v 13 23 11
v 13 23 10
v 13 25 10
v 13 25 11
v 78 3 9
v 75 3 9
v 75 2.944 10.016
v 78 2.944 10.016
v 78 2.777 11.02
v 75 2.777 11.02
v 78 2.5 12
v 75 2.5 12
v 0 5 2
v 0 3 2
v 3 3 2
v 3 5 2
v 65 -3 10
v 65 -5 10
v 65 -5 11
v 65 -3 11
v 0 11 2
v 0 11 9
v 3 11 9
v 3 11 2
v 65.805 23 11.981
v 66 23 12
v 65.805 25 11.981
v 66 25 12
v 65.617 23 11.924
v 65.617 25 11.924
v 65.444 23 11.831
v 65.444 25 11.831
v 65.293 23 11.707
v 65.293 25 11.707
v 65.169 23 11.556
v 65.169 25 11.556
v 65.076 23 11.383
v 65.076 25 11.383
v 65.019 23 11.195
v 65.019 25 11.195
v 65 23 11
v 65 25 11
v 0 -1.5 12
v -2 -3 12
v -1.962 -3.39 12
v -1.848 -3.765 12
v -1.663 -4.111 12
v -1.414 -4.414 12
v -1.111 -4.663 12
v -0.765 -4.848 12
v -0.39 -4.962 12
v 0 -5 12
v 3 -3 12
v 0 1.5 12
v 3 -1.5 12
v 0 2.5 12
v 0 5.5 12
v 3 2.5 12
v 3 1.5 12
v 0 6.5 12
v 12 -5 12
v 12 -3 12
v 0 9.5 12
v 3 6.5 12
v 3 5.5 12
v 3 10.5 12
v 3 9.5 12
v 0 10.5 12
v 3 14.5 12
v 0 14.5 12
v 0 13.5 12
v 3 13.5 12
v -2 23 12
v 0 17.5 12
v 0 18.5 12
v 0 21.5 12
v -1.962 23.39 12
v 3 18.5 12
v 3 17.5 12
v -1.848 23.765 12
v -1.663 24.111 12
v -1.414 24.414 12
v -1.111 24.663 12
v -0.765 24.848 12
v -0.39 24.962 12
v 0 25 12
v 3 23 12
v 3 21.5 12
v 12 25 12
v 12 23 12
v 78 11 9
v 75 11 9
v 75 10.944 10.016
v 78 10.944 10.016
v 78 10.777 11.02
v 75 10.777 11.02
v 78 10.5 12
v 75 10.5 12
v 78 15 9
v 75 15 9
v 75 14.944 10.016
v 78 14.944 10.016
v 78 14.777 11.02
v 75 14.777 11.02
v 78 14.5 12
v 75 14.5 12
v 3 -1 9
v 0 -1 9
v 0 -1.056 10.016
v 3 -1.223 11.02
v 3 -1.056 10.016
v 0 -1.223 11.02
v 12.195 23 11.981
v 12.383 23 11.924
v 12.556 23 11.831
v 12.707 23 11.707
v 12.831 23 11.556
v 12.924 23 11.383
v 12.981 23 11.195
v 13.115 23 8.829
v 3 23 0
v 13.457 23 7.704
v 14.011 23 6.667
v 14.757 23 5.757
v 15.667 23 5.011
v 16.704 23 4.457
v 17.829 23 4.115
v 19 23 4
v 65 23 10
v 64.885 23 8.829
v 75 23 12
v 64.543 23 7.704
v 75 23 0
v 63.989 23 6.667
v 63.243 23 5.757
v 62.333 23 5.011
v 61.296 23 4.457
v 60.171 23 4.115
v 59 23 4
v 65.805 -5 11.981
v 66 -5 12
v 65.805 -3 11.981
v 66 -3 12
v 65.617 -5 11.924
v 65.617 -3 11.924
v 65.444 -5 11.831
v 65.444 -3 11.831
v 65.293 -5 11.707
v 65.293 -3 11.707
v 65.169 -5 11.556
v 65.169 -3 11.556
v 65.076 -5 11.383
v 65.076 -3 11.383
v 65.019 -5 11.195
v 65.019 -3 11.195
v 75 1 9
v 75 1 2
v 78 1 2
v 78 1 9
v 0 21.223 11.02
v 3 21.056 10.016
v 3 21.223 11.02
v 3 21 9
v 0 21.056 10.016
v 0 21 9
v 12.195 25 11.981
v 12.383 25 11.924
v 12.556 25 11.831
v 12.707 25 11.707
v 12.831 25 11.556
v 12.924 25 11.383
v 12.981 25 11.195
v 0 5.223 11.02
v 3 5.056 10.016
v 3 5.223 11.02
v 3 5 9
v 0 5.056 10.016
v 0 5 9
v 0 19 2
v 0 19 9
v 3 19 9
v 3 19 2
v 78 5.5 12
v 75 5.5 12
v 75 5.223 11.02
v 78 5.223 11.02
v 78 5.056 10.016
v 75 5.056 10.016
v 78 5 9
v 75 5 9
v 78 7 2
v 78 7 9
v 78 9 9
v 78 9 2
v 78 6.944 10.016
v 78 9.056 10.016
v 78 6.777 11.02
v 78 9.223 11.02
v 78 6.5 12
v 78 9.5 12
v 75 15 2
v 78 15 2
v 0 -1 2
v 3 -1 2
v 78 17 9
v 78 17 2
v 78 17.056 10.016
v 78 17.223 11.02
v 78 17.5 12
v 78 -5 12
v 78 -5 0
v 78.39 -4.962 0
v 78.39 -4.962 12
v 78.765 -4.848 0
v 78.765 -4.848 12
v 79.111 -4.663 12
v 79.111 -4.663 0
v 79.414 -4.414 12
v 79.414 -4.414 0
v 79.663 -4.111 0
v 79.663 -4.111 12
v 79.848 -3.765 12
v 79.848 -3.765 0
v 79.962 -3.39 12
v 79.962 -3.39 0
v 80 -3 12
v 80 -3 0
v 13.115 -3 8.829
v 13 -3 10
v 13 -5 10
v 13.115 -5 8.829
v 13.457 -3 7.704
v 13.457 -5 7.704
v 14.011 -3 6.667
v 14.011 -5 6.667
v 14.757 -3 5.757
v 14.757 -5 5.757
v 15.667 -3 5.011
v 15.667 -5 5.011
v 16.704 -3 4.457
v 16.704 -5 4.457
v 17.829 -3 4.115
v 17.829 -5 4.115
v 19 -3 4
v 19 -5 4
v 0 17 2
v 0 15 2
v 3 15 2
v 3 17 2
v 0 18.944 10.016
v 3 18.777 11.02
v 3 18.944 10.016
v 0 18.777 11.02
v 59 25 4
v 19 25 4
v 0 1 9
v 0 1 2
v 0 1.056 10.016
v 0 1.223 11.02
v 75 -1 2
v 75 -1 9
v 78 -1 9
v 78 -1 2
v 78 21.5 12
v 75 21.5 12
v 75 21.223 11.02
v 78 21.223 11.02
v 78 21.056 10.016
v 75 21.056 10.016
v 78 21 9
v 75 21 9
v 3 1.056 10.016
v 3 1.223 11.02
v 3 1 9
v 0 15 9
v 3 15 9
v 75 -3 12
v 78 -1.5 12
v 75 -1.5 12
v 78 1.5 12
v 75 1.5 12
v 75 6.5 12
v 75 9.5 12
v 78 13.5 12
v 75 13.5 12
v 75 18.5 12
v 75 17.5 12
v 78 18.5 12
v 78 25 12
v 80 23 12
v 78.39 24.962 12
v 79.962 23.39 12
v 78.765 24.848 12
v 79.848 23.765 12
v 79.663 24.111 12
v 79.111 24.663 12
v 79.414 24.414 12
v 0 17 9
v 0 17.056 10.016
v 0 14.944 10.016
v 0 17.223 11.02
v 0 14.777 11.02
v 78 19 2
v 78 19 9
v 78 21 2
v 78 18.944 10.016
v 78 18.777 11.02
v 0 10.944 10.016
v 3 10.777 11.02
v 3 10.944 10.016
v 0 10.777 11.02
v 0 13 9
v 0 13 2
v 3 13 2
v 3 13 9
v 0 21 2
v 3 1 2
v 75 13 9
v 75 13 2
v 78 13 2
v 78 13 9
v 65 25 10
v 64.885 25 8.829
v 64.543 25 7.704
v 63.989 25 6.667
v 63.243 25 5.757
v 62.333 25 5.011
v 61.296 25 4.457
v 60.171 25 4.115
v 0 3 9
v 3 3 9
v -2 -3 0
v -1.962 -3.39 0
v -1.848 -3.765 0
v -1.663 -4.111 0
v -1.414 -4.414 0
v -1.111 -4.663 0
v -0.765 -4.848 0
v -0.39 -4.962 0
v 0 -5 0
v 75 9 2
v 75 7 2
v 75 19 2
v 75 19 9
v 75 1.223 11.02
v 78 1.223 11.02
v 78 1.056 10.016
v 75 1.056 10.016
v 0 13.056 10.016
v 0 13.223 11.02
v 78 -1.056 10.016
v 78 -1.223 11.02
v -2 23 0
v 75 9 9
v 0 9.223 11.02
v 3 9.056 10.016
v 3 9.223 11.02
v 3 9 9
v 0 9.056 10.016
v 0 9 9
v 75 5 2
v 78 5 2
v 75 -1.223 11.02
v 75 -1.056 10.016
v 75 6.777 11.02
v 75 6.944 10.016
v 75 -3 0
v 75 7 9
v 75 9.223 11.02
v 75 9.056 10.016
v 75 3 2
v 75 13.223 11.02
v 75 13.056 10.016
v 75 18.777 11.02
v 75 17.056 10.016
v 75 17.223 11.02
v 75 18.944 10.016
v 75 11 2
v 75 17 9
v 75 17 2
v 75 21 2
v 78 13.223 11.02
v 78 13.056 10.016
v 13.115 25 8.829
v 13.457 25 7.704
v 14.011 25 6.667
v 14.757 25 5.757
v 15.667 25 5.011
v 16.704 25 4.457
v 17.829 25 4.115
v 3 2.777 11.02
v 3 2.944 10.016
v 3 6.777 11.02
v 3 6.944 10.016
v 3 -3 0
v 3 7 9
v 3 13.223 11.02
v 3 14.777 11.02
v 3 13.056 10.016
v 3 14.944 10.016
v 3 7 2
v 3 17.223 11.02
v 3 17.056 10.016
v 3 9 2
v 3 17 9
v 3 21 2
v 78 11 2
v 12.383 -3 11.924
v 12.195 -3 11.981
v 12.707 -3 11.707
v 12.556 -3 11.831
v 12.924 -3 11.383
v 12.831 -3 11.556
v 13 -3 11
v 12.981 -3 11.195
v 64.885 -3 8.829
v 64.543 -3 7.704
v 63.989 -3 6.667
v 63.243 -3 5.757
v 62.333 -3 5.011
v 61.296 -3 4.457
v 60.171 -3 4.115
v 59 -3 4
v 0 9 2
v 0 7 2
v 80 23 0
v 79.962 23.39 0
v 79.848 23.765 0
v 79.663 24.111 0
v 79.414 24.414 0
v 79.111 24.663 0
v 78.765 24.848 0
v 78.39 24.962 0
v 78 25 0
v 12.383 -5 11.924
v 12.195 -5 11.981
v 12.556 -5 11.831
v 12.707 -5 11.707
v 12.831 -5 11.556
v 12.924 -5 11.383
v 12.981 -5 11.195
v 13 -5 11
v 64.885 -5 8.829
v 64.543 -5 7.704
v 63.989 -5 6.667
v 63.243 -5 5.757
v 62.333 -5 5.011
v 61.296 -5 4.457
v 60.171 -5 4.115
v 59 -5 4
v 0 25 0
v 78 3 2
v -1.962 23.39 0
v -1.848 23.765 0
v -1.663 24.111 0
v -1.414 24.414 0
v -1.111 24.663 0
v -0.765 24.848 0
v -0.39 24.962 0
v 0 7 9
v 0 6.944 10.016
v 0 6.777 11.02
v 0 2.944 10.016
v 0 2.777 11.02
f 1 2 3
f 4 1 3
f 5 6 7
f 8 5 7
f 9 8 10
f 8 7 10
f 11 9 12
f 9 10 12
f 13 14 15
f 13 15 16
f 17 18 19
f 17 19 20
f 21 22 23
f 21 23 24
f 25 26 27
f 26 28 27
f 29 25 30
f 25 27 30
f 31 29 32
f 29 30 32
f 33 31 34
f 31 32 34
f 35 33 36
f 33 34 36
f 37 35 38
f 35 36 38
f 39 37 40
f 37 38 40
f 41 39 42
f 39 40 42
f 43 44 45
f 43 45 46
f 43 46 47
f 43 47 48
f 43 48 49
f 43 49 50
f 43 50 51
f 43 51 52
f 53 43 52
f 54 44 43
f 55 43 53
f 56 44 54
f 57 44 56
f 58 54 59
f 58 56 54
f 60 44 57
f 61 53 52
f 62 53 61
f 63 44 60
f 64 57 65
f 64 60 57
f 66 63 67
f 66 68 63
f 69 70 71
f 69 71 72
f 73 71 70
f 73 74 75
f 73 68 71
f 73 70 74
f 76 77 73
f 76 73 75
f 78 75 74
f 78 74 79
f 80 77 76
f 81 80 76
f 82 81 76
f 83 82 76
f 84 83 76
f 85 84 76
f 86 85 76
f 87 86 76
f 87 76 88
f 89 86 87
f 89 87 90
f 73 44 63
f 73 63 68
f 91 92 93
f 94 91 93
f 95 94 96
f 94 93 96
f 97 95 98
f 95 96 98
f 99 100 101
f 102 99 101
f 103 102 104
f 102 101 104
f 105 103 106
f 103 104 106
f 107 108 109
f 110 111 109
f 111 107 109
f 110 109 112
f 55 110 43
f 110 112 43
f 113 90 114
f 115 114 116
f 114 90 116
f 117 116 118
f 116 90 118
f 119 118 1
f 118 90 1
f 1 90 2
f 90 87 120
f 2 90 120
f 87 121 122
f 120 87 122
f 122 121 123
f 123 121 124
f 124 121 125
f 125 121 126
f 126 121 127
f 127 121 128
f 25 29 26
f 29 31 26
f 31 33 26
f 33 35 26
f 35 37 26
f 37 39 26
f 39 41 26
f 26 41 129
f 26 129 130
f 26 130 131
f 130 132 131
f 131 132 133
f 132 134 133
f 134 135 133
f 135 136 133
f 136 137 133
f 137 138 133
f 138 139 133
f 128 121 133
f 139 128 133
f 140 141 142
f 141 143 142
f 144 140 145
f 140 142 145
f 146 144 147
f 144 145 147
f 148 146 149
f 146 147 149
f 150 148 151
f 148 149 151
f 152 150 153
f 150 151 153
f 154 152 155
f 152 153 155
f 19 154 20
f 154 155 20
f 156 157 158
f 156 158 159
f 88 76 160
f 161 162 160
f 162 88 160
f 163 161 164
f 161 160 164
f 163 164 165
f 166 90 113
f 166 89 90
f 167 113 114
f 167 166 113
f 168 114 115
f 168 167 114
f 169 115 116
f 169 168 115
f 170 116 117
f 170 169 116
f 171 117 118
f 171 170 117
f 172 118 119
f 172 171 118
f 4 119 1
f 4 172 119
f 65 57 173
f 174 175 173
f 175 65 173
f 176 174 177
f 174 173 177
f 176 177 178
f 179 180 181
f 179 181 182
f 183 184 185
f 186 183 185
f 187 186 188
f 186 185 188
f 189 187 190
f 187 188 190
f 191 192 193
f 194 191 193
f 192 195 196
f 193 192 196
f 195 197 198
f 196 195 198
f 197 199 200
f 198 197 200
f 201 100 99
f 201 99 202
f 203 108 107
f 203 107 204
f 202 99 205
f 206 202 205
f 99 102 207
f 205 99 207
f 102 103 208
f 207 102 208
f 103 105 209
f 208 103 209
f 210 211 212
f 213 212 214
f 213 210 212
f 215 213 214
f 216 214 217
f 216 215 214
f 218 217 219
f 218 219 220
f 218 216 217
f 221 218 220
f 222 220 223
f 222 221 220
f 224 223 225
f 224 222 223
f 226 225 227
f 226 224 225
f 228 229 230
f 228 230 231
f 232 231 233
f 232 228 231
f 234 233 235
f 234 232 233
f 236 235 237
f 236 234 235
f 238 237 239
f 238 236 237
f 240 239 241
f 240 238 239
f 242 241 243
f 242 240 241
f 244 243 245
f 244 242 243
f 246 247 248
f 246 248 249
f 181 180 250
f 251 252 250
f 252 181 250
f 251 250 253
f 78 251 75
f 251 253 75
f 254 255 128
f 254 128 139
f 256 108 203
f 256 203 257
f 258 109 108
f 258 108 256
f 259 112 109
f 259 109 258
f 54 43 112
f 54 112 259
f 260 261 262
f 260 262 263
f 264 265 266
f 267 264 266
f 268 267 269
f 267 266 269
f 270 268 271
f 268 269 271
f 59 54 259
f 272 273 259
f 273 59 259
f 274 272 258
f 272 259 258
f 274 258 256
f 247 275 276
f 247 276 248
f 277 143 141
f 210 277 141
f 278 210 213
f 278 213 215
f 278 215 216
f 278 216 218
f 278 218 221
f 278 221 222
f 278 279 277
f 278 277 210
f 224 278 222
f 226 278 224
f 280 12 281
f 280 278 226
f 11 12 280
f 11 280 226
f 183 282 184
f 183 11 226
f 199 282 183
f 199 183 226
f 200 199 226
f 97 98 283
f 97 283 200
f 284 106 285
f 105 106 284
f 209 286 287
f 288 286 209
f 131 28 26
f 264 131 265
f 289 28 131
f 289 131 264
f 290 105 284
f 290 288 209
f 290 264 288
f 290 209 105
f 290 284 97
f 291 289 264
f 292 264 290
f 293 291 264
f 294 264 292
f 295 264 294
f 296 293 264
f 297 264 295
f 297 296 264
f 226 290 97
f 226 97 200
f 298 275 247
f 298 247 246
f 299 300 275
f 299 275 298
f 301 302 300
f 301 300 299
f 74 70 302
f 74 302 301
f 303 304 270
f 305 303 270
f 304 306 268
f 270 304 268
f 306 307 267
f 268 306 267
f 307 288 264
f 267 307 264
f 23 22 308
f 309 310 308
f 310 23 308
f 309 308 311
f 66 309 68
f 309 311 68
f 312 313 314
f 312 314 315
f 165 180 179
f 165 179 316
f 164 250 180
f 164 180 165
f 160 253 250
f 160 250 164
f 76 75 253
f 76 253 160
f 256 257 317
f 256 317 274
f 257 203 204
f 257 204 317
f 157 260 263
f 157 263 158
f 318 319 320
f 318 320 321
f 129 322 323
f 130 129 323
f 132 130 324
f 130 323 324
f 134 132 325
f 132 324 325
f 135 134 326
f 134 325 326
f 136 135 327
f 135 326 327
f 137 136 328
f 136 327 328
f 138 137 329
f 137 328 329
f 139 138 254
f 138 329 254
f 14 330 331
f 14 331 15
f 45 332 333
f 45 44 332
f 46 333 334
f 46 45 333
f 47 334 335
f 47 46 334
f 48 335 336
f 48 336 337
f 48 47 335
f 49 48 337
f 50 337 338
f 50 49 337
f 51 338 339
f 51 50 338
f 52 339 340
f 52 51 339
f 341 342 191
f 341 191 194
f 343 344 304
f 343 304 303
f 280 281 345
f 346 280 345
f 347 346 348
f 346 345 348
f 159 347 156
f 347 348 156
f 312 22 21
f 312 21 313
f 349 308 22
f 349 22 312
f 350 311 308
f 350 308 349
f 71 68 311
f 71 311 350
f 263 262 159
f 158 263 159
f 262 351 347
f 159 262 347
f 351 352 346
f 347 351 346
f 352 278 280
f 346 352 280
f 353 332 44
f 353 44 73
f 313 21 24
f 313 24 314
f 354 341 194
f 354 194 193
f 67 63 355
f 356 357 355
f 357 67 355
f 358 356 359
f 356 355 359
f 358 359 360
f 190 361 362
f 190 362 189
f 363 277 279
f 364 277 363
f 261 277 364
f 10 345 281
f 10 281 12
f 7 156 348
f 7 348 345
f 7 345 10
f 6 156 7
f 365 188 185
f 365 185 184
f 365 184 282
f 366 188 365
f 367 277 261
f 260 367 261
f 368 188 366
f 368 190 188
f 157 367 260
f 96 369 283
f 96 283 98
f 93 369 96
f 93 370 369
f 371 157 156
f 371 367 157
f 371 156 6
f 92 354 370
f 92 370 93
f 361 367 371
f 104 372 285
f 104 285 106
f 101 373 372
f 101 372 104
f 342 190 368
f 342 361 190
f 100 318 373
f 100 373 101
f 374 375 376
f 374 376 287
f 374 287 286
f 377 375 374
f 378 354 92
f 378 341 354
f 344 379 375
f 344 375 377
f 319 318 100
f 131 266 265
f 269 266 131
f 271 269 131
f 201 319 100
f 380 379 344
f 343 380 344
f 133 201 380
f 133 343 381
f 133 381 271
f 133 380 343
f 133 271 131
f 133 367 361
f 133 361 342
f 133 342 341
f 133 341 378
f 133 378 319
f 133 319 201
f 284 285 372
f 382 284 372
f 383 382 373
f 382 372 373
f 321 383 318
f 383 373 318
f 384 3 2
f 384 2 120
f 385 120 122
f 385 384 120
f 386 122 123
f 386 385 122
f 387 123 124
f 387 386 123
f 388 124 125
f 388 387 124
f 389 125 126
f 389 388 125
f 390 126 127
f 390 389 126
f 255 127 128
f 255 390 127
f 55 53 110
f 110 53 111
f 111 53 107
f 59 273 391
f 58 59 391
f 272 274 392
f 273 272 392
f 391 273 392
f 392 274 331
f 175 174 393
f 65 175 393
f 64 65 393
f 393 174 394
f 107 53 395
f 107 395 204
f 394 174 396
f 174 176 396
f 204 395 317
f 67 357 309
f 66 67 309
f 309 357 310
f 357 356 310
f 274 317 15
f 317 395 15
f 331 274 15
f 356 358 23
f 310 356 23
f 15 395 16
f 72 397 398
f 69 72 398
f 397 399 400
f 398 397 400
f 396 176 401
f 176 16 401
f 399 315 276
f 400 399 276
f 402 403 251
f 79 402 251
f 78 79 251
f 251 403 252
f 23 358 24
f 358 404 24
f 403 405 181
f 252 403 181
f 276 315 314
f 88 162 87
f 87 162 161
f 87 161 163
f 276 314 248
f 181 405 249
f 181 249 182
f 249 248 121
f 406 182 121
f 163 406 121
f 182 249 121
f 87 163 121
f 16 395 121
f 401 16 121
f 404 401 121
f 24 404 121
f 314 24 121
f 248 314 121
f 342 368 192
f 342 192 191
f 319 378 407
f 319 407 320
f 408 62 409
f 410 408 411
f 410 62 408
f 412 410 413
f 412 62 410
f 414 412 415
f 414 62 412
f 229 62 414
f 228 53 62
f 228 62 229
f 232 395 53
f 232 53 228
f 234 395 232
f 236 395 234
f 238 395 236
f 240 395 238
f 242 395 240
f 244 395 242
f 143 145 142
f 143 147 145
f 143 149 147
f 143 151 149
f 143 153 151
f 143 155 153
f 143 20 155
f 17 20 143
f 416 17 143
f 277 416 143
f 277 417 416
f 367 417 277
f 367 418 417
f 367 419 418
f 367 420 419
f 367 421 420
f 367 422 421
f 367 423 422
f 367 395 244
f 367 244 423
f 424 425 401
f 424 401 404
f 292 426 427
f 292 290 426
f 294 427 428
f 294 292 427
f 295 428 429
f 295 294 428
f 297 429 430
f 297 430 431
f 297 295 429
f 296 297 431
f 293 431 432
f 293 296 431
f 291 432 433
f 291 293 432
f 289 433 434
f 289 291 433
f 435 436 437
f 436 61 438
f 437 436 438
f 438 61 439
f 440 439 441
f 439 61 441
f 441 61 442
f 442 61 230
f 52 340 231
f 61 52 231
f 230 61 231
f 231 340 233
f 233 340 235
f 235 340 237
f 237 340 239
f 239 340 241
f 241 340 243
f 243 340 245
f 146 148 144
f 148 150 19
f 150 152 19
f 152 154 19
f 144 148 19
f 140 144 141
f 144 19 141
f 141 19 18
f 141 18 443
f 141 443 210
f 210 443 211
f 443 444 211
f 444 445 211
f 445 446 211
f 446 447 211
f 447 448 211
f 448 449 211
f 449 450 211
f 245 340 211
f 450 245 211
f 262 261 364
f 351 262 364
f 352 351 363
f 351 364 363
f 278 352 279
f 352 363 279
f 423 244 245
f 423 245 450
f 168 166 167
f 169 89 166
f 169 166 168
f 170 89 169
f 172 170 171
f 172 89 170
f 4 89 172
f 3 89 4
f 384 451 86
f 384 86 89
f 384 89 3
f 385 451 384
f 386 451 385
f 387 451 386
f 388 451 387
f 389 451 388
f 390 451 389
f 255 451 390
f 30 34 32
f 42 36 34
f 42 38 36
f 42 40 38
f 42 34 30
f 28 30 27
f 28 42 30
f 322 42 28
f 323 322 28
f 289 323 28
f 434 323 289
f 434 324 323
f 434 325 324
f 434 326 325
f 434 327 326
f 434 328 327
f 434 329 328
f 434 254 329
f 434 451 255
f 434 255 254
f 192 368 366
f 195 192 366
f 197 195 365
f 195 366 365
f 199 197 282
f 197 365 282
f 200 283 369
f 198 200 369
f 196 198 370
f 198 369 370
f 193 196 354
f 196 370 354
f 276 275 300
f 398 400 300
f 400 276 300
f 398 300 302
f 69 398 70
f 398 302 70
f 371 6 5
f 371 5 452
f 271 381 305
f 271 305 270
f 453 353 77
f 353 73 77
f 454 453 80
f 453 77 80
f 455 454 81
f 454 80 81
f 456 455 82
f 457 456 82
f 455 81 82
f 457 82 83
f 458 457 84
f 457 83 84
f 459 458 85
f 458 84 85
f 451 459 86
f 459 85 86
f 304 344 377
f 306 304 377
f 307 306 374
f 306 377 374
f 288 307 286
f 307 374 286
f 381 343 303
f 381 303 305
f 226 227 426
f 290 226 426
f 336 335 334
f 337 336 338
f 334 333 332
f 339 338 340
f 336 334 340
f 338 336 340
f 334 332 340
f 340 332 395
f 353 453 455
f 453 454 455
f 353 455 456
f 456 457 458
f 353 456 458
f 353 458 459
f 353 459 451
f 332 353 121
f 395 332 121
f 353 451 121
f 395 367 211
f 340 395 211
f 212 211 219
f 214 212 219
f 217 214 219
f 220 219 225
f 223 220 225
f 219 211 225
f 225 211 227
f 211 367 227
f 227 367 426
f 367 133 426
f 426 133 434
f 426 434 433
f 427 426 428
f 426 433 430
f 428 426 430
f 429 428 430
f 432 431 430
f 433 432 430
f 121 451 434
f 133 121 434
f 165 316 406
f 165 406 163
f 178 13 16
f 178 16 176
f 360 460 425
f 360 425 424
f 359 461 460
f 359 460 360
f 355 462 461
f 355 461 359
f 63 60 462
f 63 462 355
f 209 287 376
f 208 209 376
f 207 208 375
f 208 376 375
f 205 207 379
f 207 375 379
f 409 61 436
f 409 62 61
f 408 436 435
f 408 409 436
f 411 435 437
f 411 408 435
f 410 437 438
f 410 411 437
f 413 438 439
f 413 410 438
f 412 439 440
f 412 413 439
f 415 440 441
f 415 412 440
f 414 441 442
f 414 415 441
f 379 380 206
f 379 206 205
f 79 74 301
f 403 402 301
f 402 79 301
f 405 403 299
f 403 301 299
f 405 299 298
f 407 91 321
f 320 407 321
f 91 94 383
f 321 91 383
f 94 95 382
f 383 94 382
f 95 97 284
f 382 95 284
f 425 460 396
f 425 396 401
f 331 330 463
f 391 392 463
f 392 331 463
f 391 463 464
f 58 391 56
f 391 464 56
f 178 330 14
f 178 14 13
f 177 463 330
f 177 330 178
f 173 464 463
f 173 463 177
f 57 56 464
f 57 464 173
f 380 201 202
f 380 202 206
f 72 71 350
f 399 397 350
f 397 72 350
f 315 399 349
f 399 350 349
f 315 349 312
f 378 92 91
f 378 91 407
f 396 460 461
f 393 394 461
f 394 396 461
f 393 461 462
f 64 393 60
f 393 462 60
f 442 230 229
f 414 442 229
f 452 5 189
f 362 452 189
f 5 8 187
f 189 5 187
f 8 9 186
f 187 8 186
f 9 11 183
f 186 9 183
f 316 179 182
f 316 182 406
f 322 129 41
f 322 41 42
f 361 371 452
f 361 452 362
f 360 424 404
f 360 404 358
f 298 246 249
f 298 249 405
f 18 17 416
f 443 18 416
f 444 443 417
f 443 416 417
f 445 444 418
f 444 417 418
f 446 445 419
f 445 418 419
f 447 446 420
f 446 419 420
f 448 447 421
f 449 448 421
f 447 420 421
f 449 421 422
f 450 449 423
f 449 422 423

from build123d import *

# Parameters (mm, degrees)
BOX001_W      = 72
BOX001_H      = 26
BOX001_DEPTH  = 12
BOX002_W      = 52
BOX002_H      = 34
BOX002_DEPTH  = 8
FILLET001_R   = 6
PAD_DEPTH     = 78
ARRAY_Y_COUNT = 6
ARRAY_Y_PITCH = 4
BOX_W         = 82
BOX_H         = 30
BOX_DEPTH     = 12
FILLET_R      = 2
FILLET002_R   = 1


with BuildPart() as slide_internal_cube:
    # Box001 → Box001 (new body)
    with BuildSketch(Plane(origin=(3, -3, 0), x_dir=(1, 0, 0), z_dir=(0, 0, 1))):
        with Locations((36, 13)):
            Rectangle(BOX001_W, BOX001_H)
    extrude(amount=BOX001_DEPTH)


with BuildPart() as middle_extract_cube_fillet:
    # Box002 → Box002 (new body)
    with BuildSketch(Plane(origin=(13, -7, 4), x_dir=(1, 0, 0), z_dir=(0, 0, 1))):
        with Locations((26, 17)):
            Rectangle(BOX002_W, BOX002_H)
    extrude(amount=BOX002_DEPTH)

    # Fillet001
    fillet001_edges = [middle_extract_cube_fillet.edges().sort_by_distance(p)[0] for p in [
        (13, 10, 4),
        (65, 10, 4),
    ]]
    fillet(fillet001_edges, radius=FILLET001_R)


with BuildPart() as extract_fusion:
    # Sketch → Pad (new body)
    with BuildSketch(Plane.YZ):
        with BuildLine():
            Line((-1, 9), (-1, 2))
            Line((-1, 2), (1, 2))
            Line((1, 2), (1, 9))
            ThreePointArc((1.5, 12), (1.125856, 10.520691), (1, 9))
            Line((-1.5, 12), (1.5, 12))
            ThreePointArc((-1, 9), (-1.125856, 10.520691), (-1.5, 12))
        make_face()
    extrude(amount=PAD_DEPTH)

    # Array Y: extract fusion ×6


with BuildPart() as extract_fusion_1:
    add(extract_fusion.part)
    with Locations(*[(0, i * ARRAY_Y_PITCH, 0) for i in range(1, ARRAY_Y_COUNT)]):
        add(extract_fusion.part)

    # Fusion: union slide internal cube, middle extract cube fillet
    add(slide_internal_cube.part)
    add(middle_extract_cube_fillet.part)


with BuildPart() as slide_box_fillet:
    # Box → Box (new body)
    with BuildSketch(Plane(origin=(-2, -5, 0), x_dir=(1, 0, 0), z_dir=(0, 0, 1))):
        with Locations((41, 15)):
            Rectangle(BOX_W, BOX_H)
    extrude(amount=BOX_DEPTH)

    # Fillet
    fillet_edges = [slide_box_fillet.edges().sort_by_distance(p)[0] for p in [
        (-2, -5, 6),
        (-2, 25, 6),
        (80, -5, 6),
        (80, 25, 6),
    ]]
    fillet(fillet_edges, radius=FILLET_R)

    # Cut: cut extract fusion
    add(extract_fusion_1.part, mode=Mode.SUBTRACT)

    # Fillet002
    fillet002_edges = [slide_box_fillet.edges().sort_by_distance(p)[0] for p in [
        (13, 24, 12),
        (13, -4, 12),
        (65, -4, 12),
        (65, 24, 12),
    ]]
    fillet(fillet002_edges, radius=FILLET002_R)


solid = slide_box_fillet.part
